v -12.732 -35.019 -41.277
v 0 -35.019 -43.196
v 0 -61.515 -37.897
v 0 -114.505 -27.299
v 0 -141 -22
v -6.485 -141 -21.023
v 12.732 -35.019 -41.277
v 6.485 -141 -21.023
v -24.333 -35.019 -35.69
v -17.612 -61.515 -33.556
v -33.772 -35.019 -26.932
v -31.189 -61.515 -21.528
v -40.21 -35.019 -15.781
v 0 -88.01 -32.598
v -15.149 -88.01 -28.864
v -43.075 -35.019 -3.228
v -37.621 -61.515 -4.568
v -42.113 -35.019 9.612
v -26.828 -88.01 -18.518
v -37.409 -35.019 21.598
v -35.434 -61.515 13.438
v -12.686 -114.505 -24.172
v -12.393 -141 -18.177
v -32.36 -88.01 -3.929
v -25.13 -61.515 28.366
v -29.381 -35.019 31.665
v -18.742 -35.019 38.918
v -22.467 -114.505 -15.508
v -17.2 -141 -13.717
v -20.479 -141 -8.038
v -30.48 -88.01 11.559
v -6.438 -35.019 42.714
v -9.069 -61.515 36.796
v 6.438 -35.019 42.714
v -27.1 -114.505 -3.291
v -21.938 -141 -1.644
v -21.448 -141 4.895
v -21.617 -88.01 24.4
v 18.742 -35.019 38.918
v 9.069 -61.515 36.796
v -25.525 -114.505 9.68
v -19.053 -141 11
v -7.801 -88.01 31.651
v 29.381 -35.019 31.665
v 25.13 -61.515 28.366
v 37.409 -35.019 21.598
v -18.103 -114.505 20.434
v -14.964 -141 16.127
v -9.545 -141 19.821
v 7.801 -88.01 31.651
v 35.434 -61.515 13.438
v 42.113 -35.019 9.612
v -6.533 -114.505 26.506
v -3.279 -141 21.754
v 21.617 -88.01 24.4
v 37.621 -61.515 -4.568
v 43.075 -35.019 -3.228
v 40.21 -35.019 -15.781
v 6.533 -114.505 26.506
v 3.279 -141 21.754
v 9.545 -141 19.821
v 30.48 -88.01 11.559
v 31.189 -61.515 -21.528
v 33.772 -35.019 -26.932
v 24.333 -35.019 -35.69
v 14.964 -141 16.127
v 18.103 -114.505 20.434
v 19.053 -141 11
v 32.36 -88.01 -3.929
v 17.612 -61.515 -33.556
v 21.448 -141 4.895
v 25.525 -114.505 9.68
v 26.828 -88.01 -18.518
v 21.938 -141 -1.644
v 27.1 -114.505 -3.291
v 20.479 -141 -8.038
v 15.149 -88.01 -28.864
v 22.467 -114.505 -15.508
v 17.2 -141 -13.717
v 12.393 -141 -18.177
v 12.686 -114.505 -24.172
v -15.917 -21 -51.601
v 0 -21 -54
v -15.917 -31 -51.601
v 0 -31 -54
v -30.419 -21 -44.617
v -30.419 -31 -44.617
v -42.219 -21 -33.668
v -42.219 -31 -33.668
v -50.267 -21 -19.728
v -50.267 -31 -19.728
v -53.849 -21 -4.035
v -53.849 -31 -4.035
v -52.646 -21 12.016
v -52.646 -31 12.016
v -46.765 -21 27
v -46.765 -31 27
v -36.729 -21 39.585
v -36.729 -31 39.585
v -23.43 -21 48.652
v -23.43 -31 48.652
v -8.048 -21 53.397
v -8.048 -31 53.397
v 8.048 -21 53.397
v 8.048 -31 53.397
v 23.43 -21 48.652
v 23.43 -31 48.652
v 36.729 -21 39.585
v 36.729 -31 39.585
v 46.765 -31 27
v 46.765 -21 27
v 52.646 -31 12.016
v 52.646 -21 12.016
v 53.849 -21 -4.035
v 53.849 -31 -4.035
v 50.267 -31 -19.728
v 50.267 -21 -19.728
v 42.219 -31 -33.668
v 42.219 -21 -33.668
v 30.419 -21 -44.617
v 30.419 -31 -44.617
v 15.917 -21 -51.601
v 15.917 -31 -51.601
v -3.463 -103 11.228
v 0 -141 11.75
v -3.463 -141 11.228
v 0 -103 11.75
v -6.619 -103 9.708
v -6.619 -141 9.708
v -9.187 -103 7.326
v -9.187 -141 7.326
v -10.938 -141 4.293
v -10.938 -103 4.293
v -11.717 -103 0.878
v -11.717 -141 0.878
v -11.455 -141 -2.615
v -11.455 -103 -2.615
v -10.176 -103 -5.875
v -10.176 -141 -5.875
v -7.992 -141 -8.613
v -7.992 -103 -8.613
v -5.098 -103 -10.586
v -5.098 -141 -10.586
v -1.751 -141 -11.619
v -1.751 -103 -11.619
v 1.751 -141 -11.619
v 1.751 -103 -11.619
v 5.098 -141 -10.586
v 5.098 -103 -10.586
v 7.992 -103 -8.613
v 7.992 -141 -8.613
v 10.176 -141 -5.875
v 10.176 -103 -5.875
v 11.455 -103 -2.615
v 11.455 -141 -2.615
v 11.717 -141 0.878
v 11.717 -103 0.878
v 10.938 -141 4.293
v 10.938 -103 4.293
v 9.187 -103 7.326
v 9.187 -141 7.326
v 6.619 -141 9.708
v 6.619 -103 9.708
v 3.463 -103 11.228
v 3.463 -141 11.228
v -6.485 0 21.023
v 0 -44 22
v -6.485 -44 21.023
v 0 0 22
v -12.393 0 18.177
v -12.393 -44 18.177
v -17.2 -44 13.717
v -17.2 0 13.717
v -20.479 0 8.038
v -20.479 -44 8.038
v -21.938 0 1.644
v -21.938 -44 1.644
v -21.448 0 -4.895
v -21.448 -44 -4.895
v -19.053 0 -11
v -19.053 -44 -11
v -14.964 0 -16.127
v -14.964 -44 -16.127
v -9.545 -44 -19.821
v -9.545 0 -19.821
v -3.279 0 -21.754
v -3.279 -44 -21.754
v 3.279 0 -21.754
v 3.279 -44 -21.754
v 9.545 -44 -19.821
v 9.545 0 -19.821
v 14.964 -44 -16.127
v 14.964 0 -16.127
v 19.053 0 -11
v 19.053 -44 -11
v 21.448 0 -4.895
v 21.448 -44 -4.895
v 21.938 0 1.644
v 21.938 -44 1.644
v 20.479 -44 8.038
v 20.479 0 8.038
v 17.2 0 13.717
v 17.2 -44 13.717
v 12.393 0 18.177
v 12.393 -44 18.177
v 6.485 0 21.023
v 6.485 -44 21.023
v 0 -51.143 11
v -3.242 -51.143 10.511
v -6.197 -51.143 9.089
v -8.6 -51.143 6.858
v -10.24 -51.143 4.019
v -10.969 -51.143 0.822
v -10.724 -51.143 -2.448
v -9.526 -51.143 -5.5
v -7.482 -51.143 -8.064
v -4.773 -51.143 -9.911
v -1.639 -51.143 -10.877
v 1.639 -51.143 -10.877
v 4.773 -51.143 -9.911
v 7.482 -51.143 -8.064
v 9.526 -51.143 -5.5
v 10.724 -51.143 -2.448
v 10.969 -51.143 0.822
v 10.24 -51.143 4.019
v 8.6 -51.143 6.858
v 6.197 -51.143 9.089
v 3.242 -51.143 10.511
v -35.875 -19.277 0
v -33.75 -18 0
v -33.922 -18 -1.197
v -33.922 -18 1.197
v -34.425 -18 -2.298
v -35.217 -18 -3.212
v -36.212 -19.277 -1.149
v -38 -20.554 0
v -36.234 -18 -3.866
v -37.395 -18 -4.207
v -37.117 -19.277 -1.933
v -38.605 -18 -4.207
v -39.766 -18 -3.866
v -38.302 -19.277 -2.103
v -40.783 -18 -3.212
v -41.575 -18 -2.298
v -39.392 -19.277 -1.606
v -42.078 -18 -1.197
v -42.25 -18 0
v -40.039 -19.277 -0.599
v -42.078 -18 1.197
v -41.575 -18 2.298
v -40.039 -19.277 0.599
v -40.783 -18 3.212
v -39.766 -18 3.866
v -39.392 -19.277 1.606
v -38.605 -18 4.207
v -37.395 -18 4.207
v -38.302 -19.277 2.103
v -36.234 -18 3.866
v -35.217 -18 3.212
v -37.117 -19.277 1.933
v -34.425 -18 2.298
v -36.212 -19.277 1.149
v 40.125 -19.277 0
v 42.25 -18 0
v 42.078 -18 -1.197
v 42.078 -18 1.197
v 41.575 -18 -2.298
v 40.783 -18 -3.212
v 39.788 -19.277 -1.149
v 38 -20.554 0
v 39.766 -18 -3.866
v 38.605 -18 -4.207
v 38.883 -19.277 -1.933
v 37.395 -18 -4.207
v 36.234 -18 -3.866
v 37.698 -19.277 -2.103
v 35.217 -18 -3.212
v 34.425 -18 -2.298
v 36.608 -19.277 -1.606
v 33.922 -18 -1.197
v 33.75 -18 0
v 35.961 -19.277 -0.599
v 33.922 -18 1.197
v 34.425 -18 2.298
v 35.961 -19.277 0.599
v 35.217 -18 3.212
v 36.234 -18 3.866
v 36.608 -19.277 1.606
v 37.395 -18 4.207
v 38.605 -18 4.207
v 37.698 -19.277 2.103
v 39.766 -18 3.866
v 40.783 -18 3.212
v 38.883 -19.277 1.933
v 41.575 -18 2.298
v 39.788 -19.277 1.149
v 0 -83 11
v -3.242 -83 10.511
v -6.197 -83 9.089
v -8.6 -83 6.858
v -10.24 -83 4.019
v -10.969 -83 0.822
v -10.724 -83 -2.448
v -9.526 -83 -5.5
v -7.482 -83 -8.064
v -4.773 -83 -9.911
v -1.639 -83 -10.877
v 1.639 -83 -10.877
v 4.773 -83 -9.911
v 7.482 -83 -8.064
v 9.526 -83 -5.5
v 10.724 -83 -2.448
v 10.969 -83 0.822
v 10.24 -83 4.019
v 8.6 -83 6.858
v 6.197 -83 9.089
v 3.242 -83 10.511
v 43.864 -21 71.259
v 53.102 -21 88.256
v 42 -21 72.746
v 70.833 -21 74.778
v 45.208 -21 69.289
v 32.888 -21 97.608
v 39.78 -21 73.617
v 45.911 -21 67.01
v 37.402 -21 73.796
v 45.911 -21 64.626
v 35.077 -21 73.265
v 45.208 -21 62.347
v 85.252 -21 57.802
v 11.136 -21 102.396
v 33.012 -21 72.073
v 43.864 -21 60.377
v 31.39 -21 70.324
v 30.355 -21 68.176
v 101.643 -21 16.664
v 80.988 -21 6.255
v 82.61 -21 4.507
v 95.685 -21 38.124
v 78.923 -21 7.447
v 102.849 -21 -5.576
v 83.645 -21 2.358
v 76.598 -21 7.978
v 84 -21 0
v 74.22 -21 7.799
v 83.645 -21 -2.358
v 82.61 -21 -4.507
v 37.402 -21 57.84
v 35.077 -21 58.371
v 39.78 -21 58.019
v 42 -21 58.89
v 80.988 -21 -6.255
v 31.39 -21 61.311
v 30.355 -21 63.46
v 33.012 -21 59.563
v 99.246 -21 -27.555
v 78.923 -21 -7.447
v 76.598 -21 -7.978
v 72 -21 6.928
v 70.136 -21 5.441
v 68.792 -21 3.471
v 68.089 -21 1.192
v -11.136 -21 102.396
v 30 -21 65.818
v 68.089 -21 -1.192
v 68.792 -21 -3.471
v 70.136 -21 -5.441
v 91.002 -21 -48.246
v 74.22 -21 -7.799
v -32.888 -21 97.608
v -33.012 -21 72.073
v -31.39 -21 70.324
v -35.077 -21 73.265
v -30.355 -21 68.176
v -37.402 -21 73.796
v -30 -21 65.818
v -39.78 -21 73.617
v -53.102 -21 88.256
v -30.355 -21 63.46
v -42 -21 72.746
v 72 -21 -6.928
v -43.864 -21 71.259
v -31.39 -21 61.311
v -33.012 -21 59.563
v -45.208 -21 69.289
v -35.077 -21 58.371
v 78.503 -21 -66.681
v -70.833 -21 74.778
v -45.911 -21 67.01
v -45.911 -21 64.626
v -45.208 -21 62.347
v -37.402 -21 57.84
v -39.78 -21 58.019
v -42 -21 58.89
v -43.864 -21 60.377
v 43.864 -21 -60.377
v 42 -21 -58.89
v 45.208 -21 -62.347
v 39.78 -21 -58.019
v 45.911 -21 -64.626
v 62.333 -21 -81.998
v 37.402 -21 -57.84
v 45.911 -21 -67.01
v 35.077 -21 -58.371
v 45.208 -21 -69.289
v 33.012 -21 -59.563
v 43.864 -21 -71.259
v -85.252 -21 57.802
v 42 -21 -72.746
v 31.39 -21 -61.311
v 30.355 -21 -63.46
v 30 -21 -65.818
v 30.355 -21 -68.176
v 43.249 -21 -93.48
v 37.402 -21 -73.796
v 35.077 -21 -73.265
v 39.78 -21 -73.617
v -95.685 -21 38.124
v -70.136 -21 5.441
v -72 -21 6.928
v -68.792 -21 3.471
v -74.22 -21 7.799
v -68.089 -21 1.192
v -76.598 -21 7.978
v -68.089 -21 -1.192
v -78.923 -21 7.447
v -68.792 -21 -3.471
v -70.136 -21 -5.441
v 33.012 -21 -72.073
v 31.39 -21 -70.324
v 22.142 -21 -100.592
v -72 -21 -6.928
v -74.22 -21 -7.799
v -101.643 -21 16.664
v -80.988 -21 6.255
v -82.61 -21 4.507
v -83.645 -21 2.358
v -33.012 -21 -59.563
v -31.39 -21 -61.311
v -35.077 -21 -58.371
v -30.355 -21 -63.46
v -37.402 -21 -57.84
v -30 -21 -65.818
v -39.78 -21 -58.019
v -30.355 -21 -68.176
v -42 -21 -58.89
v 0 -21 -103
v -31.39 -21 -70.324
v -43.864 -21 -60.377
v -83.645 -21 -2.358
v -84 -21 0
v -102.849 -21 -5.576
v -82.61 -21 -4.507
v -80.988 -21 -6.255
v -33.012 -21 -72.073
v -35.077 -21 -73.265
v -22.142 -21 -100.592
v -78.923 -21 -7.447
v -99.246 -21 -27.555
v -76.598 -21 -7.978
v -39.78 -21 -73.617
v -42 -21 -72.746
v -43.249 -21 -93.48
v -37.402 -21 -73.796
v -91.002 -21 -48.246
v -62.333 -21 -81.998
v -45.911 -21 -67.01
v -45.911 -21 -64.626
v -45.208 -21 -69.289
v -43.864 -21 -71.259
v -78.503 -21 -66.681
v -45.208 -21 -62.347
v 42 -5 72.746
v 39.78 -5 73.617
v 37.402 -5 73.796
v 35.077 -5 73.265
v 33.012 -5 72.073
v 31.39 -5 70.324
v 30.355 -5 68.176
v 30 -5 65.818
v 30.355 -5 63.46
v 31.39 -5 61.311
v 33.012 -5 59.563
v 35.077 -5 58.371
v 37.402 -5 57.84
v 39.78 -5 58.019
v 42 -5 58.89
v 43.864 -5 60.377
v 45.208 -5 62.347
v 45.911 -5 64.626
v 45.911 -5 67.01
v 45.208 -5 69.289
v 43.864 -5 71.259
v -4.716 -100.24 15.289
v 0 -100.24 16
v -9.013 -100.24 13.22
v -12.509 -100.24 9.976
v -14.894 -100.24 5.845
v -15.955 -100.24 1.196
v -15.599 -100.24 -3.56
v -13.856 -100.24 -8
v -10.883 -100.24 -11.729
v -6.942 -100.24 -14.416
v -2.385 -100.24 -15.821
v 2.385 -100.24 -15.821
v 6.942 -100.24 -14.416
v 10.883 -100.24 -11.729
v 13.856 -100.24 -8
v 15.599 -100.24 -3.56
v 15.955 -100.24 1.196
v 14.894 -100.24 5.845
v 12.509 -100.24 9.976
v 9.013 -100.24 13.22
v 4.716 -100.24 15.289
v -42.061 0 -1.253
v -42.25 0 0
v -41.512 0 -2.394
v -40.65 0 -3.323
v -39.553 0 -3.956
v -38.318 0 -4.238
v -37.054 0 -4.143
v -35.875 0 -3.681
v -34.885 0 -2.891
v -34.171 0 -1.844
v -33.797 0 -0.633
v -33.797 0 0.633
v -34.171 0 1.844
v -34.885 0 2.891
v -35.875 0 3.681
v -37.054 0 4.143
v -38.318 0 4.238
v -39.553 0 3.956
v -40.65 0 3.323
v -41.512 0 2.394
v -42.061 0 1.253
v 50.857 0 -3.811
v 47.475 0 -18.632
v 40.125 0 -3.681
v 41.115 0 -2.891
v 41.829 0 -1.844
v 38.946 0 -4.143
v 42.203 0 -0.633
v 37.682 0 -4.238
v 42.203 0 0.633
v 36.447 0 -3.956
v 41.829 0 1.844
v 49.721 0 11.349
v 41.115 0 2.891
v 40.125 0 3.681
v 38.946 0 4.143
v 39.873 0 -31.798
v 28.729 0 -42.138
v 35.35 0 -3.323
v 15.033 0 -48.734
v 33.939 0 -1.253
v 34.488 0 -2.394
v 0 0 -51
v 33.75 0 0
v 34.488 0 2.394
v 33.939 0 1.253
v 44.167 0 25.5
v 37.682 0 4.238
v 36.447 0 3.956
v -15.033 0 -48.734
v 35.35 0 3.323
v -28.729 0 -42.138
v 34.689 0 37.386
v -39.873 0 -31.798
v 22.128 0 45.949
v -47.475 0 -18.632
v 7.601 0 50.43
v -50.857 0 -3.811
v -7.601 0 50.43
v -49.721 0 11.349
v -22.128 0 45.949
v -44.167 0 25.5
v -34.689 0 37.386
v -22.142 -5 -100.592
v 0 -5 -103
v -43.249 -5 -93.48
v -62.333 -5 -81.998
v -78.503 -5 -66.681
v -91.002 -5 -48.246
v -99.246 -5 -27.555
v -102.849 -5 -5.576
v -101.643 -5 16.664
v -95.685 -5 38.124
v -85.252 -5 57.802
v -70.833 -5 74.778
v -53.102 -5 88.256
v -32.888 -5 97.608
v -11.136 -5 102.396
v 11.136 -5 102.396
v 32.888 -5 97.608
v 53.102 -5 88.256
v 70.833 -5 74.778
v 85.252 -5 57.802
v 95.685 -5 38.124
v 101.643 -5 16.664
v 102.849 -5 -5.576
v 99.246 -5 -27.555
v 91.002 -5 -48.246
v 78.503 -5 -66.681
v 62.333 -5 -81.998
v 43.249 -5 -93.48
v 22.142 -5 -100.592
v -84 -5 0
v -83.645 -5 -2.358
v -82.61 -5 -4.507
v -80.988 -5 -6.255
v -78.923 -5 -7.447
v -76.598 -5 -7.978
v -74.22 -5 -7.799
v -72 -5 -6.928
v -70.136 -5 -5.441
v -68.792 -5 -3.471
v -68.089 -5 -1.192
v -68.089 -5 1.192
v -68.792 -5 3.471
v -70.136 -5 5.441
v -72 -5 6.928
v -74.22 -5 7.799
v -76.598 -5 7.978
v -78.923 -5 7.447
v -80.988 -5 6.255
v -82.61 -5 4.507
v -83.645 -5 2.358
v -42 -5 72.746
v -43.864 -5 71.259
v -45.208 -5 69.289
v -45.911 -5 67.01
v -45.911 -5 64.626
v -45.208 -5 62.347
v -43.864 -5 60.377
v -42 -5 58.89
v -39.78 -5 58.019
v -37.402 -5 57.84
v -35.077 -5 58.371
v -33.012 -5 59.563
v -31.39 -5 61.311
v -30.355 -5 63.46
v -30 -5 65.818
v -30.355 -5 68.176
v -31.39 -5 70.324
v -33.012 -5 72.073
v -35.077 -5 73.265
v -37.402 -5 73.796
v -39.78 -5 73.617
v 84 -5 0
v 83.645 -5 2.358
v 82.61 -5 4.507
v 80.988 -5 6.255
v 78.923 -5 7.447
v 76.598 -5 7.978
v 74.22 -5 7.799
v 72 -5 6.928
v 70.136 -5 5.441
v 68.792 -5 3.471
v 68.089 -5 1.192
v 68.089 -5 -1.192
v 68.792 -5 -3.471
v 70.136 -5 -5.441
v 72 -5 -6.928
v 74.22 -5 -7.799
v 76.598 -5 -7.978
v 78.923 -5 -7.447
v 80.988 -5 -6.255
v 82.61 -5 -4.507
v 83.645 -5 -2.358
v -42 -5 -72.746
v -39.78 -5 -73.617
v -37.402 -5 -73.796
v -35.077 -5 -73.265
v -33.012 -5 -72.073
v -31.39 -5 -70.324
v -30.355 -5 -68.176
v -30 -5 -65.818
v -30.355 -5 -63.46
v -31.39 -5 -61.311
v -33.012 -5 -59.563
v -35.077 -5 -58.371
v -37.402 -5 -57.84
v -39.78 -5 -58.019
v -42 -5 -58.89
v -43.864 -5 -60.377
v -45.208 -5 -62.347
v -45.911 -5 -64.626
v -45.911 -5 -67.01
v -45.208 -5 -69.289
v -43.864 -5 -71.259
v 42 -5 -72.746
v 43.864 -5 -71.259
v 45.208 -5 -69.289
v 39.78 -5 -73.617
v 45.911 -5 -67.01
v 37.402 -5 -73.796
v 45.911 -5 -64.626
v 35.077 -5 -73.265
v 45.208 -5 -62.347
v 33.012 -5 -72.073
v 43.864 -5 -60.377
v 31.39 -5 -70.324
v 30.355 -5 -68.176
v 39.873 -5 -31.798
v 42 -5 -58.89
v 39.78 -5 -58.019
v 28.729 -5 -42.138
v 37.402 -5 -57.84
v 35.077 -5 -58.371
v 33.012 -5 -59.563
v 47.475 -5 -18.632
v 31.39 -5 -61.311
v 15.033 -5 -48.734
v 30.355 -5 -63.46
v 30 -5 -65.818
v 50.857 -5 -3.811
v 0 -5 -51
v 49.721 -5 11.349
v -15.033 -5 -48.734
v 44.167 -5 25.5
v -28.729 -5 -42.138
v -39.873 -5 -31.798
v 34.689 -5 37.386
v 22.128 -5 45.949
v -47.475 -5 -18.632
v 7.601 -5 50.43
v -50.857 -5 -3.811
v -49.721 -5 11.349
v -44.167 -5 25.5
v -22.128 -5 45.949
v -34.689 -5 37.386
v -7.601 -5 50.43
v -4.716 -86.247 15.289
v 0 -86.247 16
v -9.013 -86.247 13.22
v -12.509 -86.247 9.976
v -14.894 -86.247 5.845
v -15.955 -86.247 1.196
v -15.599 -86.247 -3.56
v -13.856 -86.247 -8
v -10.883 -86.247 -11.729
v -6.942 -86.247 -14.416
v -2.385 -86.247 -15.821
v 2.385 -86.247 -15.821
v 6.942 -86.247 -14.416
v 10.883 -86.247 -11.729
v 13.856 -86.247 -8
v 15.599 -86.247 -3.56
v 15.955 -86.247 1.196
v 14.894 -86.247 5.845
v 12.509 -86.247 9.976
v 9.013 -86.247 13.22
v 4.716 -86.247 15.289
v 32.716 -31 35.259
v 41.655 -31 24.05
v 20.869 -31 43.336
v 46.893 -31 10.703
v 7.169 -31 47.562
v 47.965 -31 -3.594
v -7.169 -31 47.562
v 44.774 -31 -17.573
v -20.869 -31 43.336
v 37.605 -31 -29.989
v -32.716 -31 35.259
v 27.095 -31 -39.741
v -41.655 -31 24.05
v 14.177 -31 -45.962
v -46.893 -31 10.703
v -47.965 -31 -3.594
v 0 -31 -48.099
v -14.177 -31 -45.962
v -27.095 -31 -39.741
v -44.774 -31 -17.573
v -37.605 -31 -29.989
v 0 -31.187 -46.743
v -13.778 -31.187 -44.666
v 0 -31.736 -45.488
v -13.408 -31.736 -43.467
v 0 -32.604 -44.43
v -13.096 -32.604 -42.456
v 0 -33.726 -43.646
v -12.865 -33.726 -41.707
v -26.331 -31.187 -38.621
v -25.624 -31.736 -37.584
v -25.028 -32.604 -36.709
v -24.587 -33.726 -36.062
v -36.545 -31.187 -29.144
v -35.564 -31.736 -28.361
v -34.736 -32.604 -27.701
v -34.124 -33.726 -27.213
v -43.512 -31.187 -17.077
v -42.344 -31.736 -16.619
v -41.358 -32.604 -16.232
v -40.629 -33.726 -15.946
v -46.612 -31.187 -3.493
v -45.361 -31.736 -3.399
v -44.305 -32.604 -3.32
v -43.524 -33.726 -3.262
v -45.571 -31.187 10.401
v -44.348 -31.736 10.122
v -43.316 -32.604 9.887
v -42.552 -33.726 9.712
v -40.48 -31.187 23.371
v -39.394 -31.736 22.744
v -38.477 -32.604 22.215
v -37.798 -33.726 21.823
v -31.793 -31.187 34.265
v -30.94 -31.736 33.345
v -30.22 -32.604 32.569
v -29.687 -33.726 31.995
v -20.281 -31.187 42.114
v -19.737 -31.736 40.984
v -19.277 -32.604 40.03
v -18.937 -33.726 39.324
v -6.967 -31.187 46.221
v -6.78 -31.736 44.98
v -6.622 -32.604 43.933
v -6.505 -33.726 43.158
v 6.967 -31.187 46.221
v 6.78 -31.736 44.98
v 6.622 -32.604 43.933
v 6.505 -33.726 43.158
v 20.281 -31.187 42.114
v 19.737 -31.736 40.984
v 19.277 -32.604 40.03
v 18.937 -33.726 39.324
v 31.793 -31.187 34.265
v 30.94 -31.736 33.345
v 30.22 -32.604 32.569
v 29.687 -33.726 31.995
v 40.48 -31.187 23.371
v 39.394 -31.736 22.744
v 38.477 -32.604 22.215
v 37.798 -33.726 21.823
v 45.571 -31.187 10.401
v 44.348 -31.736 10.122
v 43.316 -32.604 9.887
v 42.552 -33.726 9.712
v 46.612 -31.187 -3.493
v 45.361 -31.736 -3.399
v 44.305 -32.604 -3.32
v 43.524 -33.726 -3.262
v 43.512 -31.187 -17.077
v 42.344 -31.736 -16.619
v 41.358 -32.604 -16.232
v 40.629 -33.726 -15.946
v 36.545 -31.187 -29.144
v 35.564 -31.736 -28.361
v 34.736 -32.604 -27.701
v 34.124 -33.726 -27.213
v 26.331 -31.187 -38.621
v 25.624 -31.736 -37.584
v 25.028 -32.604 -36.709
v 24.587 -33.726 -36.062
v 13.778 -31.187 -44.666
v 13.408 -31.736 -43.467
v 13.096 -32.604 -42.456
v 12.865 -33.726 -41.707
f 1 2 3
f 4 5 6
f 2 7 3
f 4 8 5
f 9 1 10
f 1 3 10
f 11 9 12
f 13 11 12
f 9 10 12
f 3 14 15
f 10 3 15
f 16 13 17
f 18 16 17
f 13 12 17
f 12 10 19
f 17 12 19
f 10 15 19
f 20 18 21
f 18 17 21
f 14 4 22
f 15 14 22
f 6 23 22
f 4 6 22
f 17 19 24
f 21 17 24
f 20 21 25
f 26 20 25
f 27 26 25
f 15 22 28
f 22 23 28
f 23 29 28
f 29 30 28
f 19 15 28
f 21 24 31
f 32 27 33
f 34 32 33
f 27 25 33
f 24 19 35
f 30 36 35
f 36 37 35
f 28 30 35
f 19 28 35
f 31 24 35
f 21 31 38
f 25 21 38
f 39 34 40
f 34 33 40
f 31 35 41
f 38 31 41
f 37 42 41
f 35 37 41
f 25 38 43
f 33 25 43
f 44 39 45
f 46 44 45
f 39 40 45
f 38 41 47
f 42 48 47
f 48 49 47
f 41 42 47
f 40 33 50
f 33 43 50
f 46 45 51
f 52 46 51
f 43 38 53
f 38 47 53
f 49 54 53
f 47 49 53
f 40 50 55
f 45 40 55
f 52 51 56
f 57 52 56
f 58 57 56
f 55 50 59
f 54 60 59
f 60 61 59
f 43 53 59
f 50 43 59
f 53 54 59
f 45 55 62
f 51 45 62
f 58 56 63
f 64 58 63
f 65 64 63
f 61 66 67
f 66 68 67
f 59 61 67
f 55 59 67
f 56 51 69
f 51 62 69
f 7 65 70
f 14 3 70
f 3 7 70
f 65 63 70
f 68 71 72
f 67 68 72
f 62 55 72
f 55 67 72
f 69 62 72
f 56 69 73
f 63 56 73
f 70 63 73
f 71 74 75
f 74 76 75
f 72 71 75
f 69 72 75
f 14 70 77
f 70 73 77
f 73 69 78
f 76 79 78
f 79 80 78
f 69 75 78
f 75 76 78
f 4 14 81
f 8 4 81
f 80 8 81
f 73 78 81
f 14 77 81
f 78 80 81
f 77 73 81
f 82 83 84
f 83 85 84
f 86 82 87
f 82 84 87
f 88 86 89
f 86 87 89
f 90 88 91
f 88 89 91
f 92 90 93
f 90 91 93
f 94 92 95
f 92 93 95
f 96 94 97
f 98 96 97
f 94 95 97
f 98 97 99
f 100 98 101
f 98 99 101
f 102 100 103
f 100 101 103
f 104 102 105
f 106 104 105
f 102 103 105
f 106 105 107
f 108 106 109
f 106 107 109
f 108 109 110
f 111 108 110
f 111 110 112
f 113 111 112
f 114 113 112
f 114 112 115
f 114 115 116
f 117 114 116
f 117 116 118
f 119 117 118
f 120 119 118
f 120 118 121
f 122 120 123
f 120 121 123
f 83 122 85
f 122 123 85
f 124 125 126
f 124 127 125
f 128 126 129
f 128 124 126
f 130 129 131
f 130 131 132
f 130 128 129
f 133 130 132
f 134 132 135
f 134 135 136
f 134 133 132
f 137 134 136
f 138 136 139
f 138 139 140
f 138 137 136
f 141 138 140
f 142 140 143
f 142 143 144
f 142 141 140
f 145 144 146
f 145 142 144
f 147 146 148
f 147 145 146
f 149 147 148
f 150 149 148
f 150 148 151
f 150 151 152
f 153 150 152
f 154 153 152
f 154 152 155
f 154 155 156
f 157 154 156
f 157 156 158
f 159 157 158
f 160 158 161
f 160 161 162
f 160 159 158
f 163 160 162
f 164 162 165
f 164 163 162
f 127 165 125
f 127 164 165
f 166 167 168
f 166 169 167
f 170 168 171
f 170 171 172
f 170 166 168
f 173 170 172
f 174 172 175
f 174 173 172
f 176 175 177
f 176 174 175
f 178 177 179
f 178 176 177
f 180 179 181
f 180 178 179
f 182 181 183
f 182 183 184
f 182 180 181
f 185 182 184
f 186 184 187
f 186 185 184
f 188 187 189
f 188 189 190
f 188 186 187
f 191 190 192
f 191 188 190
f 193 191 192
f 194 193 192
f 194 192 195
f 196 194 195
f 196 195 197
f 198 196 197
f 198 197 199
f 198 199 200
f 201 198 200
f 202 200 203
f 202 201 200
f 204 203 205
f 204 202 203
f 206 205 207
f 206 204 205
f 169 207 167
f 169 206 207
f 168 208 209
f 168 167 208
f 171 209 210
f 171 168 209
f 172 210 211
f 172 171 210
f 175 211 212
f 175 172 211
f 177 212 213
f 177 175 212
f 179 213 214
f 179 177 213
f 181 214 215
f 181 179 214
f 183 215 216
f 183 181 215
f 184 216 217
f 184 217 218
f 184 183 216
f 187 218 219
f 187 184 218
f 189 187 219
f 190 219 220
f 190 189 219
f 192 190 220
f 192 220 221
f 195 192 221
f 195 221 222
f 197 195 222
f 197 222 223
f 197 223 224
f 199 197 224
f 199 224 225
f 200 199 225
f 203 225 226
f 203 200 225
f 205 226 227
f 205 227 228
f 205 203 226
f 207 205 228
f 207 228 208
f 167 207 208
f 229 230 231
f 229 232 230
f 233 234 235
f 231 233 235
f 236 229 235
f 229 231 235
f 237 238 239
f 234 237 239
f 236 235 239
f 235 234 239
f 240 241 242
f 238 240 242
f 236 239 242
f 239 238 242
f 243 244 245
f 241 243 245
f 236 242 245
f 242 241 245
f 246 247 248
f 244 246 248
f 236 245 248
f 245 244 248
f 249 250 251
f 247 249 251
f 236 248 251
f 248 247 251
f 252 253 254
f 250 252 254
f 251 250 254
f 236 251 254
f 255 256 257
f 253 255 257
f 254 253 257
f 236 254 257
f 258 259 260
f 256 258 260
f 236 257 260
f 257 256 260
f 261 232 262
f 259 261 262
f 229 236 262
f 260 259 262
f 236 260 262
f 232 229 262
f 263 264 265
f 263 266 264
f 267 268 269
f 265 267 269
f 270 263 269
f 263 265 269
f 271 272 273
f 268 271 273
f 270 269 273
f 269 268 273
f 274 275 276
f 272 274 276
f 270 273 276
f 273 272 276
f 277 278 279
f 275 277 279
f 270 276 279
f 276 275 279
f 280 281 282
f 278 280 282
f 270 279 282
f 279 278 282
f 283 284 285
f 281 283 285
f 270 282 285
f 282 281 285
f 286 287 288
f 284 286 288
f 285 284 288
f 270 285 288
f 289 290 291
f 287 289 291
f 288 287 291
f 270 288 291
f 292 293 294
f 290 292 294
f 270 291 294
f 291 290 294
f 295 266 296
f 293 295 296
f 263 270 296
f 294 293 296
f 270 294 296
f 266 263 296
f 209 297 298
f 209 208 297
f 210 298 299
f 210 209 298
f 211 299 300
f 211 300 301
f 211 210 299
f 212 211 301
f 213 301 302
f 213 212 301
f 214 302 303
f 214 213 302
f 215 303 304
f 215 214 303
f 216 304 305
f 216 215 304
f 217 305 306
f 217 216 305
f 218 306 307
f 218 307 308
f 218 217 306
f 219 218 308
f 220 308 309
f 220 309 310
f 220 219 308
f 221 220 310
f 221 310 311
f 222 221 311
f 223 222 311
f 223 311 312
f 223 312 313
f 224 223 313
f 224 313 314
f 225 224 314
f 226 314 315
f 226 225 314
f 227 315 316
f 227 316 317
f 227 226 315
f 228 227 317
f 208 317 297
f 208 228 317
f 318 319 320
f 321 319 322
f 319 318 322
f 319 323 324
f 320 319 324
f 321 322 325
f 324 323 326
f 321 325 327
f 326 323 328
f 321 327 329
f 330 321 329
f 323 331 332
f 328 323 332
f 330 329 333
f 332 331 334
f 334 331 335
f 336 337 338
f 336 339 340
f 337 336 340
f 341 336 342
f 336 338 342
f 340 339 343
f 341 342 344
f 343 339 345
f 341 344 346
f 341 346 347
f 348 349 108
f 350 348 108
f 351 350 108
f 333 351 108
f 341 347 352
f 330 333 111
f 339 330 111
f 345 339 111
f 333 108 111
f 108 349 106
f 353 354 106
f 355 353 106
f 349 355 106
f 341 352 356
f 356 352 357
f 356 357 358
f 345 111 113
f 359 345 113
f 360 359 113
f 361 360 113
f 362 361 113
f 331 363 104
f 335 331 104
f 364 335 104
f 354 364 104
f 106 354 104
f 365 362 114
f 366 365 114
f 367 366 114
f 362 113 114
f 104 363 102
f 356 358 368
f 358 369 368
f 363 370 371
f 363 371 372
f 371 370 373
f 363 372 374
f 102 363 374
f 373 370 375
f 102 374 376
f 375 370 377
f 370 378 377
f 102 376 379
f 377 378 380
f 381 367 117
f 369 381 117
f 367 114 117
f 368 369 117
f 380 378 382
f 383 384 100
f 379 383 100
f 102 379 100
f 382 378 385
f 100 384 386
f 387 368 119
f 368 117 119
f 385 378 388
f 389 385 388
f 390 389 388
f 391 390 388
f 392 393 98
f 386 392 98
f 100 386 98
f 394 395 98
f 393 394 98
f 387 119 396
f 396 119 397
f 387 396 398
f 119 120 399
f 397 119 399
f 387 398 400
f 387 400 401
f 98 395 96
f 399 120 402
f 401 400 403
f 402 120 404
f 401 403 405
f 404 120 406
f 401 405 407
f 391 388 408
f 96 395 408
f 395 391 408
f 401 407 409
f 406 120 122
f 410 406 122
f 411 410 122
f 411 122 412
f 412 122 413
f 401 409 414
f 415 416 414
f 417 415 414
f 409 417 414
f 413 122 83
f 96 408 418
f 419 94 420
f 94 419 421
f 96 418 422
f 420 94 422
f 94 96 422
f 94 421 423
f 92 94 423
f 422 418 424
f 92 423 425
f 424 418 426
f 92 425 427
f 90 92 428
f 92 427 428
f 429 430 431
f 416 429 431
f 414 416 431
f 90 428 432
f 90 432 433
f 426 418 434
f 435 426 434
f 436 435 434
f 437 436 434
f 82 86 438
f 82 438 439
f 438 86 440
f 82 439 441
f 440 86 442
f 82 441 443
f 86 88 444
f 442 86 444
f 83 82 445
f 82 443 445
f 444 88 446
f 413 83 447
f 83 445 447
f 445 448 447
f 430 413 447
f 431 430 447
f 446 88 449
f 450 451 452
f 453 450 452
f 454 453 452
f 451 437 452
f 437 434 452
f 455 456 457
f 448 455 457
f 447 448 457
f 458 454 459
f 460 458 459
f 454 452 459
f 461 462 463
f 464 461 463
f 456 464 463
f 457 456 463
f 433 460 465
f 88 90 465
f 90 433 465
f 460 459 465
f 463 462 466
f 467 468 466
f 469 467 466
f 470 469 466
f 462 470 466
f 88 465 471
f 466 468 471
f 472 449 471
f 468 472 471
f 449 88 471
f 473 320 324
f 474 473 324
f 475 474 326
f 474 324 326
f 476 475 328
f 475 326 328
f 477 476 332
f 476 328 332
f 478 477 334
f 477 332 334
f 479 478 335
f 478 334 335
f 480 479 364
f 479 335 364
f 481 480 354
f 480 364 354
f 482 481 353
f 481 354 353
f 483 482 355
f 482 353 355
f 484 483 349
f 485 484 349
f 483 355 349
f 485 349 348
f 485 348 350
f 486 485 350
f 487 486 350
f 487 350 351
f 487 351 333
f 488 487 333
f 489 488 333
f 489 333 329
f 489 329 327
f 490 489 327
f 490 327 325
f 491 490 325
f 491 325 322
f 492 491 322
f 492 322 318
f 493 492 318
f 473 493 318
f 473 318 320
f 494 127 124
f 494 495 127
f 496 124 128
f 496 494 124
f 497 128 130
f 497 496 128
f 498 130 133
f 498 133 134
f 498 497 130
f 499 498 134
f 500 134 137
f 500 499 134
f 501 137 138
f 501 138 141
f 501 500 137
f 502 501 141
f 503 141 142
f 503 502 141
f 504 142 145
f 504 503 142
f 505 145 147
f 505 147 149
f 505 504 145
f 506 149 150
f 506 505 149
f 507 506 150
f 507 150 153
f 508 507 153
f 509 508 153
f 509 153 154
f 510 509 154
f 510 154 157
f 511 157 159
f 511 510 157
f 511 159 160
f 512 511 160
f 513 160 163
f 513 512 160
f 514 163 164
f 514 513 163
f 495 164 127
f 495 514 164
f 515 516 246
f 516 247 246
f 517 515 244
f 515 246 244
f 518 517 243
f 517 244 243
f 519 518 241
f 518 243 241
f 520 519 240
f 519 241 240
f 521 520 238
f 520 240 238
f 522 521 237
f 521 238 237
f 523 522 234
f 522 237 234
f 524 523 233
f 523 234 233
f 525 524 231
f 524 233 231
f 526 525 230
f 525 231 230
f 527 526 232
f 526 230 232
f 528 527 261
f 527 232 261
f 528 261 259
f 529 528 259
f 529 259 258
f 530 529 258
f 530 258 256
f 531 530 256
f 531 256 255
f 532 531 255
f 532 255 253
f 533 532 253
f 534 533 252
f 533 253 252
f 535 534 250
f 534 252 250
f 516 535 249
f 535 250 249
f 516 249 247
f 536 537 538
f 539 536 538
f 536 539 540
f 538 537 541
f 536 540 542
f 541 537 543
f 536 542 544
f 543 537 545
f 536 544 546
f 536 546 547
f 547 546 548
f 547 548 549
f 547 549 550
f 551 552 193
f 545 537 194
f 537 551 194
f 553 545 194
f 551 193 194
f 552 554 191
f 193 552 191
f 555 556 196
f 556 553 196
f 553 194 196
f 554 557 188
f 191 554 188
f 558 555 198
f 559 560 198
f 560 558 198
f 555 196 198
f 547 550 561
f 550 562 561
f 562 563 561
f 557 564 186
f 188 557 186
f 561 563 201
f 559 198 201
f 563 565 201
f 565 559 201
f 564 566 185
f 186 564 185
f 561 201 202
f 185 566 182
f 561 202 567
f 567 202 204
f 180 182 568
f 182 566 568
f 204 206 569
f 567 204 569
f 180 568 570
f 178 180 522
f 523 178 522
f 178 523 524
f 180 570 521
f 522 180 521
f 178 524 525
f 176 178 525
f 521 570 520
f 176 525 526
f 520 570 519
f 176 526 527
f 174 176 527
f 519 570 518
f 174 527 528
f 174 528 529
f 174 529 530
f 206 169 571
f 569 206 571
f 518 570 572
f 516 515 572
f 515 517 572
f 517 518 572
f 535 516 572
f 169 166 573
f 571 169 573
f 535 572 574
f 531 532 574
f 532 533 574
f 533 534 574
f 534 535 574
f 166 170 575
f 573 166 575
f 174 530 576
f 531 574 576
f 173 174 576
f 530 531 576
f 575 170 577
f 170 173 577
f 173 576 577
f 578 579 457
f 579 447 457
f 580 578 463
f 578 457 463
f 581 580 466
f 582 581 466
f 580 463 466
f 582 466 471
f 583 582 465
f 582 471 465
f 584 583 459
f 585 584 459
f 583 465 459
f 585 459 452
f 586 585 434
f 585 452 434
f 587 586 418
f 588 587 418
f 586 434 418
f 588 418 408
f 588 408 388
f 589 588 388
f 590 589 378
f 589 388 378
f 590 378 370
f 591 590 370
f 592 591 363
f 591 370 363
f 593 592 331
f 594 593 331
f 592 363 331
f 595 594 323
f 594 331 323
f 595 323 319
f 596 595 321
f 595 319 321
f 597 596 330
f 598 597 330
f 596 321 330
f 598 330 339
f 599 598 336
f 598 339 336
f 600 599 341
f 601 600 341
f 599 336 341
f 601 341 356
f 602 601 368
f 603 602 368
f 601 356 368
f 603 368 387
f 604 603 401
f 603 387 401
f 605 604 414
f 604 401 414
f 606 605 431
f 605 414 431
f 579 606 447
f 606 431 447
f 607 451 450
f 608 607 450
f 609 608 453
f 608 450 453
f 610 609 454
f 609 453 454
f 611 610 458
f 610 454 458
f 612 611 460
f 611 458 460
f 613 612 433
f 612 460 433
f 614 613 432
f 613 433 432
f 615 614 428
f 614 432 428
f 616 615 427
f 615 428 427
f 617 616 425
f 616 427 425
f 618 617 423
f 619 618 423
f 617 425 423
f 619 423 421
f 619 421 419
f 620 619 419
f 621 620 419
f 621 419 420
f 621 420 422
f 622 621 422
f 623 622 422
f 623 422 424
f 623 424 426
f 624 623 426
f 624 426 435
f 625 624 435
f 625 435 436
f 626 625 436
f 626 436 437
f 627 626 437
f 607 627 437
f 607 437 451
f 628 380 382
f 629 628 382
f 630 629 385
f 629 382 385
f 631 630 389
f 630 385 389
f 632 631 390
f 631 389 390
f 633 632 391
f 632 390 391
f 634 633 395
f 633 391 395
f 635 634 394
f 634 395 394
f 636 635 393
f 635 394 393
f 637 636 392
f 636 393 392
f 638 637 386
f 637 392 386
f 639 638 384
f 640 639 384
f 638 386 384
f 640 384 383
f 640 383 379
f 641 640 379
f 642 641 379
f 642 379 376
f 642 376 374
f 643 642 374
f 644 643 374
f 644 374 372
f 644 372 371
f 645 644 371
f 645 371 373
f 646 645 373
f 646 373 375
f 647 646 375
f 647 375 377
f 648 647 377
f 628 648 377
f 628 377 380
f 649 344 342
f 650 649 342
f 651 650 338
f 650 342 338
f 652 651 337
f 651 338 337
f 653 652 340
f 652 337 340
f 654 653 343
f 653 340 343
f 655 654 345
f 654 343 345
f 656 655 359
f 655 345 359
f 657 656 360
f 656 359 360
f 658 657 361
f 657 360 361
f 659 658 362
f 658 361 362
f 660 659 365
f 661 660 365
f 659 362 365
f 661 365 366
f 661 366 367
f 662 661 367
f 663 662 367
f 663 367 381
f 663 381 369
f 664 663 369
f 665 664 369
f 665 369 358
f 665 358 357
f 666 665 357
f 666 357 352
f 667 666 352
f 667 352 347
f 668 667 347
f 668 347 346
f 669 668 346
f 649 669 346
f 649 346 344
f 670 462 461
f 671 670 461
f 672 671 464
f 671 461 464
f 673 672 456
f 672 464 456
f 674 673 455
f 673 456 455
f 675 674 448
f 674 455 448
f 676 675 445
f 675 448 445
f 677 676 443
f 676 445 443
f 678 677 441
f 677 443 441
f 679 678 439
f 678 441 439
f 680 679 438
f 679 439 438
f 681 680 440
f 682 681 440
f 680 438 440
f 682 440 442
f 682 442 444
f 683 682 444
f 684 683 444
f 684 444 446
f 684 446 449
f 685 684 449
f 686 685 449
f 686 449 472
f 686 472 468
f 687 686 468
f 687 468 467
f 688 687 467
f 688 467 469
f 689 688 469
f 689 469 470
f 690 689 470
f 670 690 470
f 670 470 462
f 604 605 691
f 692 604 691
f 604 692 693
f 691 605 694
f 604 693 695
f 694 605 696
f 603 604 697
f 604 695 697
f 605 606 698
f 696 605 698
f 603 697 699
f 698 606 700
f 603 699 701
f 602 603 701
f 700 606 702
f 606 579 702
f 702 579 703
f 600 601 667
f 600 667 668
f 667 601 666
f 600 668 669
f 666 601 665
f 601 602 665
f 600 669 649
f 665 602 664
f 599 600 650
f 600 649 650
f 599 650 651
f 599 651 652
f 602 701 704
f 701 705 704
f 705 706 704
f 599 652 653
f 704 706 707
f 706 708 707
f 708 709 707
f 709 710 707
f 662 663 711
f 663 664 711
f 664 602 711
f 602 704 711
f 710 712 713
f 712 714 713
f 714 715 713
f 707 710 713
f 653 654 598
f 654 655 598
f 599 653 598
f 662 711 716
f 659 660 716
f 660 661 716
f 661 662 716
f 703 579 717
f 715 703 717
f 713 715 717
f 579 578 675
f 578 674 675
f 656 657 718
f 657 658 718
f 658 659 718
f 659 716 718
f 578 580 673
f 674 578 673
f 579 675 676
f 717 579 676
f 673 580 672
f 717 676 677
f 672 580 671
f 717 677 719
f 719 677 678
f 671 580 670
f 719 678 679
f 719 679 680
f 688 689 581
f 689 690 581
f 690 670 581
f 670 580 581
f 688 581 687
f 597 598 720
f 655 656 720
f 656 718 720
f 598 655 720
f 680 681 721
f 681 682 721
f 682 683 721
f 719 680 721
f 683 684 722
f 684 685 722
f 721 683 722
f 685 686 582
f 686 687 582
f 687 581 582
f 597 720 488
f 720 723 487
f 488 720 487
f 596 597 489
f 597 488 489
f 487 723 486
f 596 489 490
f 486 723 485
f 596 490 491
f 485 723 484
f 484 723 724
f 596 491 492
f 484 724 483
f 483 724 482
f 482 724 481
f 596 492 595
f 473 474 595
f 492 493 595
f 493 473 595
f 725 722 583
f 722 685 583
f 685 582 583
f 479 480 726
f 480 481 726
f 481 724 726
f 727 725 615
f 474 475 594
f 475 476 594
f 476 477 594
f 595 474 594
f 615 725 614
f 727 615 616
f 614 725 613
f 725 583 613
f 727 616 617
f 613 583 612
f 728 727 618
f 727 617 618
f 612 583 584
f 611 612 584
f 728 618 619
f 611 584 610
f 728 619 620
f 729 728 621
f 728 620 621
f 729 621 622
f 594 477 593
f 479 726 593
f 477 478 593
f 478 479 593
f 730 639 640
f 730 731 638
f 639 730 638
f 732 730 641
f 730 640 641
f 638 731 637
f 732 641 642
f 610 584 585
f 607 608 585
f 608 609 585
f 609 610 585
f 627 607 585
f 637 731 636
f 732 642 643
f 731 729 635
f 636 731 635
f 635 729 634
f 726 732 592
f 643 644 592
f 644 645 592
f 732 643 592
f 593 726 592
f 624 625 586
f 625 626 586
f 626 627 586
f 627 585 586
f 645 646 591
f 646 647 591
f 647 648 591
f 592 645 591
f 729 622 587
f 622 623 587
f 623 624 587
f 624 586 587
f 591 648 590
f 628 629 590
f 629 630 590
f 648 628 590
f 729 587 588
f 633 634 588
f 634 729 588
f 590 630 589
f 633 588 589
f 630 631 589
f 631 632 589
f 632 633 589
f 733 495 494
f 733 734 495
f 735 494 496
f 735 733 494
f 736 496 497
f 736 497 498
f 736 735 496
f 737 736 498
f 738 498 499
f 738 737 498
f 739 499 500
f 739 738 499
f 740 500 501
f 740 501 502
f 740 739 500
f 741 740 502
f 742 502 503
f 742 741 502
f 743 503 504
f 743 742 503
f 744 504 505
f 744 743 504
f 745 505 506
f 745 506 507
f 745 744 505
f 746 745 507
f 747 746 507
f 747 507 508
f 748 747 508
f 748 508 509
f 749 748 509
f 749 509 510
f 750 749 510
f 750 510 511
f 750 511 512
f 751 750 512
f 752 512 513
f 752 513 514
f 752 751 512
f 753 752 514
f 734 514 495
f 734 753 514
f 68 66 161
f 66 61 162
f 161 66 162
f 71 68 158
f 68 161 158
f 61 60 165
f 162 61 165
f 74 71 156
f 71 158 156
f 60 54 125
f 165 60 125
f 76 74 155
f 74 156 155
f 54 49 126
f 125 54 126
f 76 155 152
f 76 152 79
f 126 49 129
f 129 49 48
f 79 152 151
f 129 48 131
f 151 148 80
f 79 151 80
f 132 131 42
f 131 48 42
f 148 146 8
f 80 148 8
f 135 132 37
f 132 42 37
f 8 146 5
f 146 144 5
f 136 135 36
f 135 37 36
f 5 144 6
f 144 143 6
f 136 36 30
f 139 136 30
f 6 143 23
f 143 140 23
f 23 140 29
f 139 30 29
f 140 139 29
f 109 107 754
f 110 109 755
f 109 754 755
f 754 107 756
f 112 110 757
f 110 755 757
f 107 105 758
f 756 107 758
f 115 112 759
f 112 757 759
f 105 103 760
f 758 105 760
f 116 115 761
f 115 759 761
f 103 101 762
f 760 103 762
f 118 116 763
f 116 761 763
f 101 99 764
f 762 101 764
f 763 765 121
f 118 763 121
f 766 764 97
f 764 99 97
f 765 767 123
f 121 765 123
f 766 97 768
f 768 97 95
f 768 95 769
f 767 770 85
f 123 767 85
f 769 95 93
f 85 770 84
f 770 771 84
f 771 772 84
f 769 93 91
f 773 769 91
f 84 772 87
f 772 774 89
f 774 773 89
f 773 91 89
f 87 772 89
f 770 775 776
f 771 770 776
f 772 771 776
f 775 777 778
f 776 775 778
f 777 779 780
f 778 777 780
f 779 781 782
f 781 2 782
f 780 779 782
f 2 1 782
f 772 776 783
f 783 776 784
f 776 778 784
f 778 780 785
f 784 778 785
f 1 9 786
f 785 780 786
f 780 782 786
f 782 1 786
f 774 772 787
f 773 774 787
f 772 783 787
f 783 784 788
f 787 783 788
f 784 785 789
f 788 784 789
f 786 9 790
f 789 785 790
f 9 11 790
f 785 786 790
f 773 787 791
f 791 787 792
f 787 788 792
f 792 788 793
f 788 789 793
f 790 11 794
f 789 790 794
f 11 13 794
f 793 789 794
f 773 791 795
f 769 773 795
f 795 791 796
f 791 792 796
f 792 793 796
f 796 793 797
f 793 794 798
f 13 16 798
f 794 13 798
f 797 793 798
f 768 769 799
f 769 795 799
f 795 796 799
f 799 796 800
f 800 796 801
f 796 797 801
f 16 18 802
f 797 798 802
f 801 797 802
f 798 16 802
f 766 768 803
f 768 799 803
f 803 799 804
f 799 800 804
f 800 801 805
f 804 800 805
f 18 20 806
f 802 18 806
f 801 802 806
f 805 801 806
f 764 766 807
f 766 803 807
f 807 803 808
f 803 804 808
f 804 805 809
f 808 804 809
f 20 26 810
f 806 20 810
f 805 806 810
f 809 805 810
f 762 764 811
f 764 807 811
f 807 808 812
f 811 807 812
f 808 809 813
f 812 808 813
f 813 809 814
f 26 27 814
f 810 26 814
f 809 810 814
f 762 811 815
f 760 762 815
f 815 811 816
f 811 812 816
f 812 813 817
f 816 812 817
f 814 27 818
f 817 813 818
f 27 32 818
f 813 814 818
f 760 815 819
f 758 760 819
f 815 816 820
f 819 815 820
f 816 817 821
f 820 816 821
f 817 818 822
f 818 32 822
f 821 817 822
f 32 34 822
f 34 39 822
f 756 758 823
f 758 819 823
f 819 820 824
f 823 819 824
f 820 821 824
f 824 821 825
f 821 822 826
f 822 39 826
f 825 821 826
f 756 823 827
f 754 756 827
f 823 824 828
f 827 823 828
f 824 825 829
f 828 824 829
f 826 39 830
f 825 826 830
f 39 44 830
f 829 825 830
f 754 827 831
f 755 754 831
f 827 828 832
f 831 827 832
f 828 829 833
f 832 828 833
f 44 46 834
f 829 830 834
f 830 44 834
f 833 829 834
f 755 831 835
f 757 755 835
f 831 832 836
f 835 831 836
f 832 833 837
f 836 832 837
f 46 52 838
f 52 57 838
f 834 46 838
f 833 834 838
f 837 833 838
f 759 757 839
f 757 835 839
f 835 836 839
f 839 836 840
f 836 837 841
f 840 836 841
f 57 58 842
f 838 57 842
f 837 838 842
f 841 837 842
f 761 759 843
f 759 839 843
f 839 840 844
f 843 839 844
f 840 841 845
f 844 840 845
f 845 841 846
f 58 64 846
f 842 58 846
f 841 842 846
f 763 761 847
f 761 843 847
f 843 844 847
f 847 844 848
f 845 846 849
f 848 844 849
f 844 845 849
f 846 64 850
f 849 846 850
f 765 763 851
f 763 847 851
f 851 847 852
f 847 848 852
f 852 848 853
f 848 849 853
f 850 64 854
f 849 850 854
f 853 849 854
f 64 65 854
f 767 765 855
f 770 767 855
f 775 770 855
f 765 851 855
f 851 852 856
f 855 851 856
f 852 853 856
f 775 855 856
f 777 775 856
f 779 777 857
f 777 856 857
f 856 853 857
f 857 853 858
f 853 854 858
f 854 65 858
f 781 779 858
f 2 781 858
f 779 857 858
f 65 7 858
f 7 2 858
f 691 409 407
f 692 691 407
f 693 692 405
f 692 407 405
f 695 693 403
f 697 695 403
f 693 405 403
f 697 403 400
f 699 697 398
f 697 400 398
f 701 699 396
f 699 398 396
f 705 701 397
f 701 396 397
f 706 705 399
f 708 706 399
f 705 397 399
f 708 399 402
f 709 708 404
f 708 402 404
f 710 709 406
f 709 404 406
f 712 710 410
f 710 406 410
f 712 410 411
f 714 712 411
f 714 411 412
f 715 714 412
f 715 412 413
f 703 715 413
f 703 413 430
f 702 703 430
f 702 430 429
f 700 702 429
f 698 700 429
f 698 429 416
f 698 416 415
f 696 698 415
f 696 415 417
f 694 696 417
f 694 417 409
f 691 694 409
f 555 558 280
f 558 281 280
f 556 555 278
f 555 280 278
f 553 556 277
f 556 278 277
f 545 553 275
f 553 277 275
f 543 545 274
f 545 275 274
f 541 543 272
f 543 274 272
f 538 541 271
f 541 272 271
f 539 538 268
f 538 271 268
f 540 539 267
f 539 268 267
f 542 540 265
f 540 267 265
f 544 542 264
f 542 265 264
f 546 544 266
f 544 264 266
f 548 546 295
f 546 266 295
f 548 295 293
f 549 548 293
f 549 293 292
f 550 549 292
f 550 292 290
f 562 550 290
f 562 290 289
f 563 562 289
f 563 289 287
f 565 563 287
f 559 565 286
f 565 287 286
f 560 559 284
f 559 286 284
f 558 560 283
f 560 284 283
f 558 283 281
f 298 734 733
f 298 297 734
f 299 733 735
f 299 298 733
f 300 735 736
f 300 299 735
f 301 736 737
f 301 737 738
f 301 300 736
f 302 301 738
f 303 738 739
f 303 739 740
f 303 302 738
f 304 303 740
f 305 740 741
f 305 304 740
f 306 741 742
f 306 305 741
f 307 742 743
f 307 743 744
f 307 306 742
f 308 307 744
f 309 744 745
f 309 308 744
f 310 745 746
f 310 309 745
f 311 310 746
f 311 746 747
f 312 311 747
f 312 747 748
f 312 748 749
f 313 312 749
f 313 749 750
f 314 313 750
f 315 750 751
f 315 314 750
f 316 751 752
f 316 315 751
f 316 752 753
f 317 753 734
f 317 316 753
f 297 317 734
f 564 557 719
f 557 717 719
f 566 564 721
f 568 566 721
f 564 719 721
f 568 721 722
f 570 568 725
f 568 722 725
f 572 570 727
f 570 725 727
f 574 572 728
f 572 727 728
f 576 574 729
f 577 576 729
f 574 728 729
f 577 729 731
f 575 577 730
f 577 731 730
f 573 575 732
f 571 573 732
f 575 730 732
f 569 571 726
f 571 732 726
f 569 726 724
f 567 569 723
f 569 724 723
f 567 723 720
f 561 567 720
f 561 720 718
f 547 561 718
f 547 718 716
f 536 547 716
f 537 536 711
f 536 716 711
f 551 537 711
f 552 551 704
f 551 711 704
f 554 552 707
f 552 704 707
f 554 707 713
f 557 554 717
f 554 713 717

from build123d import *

# Parameters (mm, degrees)
RACCORDO1_R                    = 5
FORO_1_0_16_1_D                = 16
RIPETIZIONECIRCOLARE1_COUNT    = 6
FORO_FILETTATO_M10X1_5_1_D     = 8.5
FORO_FILETTATO_M10X1_5_1_DEPTH = 18
FORO_FILETTATO_M10X1_5_1_TIP   = 2.553657631


with BuildPart() as part:
    # Schizzo1 → Rivoluzione1 (revolve)
    with BuildSketch(Plane.XY, mode=Mode.PRIVATE) as rivoluzione1_sk:
        Polygon((0, 0), (51, 0), (51, -5), (103, -5), (103, -21), (54, -21), (54, -31), (44, -31), (22, -141), (0, -141), align=None)
    revolve(rivoluzione1_sk.sketch.rotate(Axis((0, -141, 0), (0, 1, 0)), 90), axis=Axis((0, -141, 0), (0, 1, 0)))

    # Schizzo2 → Taglia-Rivoluzione1 (revolve, cut)
    with BuildSketch(Plane.XY, mode=Mode.PRIVATE) as taglia_rivoluzione1_sk:
        Polygon((0, -141), (-11.75, -141), (-11.75, -103), (-16, -100.240017729), (-16, -86.247037966), (-11, -83), (-11, -51.143483525), (-22, -44), (-22, 0), (0, 0), align=None)
    revolve(taglia_rivoluzione1_sk.sketch.rotate(Axis((0, 0, 0), (0, -1, 0)), 270), axis=Axis((0, 0, 0), (0, -1, 0)), mode=Mode.SUBTRACT)

    # Raccordo1
    raccordo1_edges = [part.edges().sort_by_distance(p)[0] for p in [
        (0, -31, 44),
    ]]
    fillet(raccordo1_edges, radius=RACCORDO1_R)

    # Foro Ø1.0 (16)-1 (through all)
    with Locations(Plane(origin=(0, -5, 0), x_dir=(1, 0, 0), z_dir=(0, 1, 0))):
        with Locations((-76, 0)):
            foro_1_0_16_1 = Hole(FORO_1_0_16_1_D / 2)

    # RipetizioneCircolare1: Foro Ø1.0 (16)-1 ×6 about axis
    ripetizionecircolare1_axis = Axis((0, 0, 0), (0, 1, 0))
    for i in range(1, RIPETIZIONECIRCOLARE1_COUNT):
        add(foro_1_0_16_1.rotate(ripetizionecircolare1_axis, i * 360 / RIPETIZIONECIRCOLARE1_COUNT), mode=Mode.SUBTRACT)

    # Foro filettato M10x1.5-1
    with Locations(Plane(origin=(0, 0, 0), x_dir=(1, 0, 0), z_dir=(0, 1, 0))):
        with Locations((38, 0), (-38, 0)):
            Hole(FORO_FILETTATO_M10X1_5_1_D / 2, depth=FORO_FILETTATO_M10X1_5_1_DEPTH)
            with Locations((0, 0, -(FORO_FILETTATO_M10X1_5_1_DEPTH + FORO_FILETTATO_M10X1_5_1_TIP / 2))):  # 118° drill point
                Cone(0, FORO_FILETTATO_M10X1_5_1_D / 2, FORO_FILETTATO_M10X1_5_1_TIP, mode=Mode.SUBTRACT)


solid = part.part
